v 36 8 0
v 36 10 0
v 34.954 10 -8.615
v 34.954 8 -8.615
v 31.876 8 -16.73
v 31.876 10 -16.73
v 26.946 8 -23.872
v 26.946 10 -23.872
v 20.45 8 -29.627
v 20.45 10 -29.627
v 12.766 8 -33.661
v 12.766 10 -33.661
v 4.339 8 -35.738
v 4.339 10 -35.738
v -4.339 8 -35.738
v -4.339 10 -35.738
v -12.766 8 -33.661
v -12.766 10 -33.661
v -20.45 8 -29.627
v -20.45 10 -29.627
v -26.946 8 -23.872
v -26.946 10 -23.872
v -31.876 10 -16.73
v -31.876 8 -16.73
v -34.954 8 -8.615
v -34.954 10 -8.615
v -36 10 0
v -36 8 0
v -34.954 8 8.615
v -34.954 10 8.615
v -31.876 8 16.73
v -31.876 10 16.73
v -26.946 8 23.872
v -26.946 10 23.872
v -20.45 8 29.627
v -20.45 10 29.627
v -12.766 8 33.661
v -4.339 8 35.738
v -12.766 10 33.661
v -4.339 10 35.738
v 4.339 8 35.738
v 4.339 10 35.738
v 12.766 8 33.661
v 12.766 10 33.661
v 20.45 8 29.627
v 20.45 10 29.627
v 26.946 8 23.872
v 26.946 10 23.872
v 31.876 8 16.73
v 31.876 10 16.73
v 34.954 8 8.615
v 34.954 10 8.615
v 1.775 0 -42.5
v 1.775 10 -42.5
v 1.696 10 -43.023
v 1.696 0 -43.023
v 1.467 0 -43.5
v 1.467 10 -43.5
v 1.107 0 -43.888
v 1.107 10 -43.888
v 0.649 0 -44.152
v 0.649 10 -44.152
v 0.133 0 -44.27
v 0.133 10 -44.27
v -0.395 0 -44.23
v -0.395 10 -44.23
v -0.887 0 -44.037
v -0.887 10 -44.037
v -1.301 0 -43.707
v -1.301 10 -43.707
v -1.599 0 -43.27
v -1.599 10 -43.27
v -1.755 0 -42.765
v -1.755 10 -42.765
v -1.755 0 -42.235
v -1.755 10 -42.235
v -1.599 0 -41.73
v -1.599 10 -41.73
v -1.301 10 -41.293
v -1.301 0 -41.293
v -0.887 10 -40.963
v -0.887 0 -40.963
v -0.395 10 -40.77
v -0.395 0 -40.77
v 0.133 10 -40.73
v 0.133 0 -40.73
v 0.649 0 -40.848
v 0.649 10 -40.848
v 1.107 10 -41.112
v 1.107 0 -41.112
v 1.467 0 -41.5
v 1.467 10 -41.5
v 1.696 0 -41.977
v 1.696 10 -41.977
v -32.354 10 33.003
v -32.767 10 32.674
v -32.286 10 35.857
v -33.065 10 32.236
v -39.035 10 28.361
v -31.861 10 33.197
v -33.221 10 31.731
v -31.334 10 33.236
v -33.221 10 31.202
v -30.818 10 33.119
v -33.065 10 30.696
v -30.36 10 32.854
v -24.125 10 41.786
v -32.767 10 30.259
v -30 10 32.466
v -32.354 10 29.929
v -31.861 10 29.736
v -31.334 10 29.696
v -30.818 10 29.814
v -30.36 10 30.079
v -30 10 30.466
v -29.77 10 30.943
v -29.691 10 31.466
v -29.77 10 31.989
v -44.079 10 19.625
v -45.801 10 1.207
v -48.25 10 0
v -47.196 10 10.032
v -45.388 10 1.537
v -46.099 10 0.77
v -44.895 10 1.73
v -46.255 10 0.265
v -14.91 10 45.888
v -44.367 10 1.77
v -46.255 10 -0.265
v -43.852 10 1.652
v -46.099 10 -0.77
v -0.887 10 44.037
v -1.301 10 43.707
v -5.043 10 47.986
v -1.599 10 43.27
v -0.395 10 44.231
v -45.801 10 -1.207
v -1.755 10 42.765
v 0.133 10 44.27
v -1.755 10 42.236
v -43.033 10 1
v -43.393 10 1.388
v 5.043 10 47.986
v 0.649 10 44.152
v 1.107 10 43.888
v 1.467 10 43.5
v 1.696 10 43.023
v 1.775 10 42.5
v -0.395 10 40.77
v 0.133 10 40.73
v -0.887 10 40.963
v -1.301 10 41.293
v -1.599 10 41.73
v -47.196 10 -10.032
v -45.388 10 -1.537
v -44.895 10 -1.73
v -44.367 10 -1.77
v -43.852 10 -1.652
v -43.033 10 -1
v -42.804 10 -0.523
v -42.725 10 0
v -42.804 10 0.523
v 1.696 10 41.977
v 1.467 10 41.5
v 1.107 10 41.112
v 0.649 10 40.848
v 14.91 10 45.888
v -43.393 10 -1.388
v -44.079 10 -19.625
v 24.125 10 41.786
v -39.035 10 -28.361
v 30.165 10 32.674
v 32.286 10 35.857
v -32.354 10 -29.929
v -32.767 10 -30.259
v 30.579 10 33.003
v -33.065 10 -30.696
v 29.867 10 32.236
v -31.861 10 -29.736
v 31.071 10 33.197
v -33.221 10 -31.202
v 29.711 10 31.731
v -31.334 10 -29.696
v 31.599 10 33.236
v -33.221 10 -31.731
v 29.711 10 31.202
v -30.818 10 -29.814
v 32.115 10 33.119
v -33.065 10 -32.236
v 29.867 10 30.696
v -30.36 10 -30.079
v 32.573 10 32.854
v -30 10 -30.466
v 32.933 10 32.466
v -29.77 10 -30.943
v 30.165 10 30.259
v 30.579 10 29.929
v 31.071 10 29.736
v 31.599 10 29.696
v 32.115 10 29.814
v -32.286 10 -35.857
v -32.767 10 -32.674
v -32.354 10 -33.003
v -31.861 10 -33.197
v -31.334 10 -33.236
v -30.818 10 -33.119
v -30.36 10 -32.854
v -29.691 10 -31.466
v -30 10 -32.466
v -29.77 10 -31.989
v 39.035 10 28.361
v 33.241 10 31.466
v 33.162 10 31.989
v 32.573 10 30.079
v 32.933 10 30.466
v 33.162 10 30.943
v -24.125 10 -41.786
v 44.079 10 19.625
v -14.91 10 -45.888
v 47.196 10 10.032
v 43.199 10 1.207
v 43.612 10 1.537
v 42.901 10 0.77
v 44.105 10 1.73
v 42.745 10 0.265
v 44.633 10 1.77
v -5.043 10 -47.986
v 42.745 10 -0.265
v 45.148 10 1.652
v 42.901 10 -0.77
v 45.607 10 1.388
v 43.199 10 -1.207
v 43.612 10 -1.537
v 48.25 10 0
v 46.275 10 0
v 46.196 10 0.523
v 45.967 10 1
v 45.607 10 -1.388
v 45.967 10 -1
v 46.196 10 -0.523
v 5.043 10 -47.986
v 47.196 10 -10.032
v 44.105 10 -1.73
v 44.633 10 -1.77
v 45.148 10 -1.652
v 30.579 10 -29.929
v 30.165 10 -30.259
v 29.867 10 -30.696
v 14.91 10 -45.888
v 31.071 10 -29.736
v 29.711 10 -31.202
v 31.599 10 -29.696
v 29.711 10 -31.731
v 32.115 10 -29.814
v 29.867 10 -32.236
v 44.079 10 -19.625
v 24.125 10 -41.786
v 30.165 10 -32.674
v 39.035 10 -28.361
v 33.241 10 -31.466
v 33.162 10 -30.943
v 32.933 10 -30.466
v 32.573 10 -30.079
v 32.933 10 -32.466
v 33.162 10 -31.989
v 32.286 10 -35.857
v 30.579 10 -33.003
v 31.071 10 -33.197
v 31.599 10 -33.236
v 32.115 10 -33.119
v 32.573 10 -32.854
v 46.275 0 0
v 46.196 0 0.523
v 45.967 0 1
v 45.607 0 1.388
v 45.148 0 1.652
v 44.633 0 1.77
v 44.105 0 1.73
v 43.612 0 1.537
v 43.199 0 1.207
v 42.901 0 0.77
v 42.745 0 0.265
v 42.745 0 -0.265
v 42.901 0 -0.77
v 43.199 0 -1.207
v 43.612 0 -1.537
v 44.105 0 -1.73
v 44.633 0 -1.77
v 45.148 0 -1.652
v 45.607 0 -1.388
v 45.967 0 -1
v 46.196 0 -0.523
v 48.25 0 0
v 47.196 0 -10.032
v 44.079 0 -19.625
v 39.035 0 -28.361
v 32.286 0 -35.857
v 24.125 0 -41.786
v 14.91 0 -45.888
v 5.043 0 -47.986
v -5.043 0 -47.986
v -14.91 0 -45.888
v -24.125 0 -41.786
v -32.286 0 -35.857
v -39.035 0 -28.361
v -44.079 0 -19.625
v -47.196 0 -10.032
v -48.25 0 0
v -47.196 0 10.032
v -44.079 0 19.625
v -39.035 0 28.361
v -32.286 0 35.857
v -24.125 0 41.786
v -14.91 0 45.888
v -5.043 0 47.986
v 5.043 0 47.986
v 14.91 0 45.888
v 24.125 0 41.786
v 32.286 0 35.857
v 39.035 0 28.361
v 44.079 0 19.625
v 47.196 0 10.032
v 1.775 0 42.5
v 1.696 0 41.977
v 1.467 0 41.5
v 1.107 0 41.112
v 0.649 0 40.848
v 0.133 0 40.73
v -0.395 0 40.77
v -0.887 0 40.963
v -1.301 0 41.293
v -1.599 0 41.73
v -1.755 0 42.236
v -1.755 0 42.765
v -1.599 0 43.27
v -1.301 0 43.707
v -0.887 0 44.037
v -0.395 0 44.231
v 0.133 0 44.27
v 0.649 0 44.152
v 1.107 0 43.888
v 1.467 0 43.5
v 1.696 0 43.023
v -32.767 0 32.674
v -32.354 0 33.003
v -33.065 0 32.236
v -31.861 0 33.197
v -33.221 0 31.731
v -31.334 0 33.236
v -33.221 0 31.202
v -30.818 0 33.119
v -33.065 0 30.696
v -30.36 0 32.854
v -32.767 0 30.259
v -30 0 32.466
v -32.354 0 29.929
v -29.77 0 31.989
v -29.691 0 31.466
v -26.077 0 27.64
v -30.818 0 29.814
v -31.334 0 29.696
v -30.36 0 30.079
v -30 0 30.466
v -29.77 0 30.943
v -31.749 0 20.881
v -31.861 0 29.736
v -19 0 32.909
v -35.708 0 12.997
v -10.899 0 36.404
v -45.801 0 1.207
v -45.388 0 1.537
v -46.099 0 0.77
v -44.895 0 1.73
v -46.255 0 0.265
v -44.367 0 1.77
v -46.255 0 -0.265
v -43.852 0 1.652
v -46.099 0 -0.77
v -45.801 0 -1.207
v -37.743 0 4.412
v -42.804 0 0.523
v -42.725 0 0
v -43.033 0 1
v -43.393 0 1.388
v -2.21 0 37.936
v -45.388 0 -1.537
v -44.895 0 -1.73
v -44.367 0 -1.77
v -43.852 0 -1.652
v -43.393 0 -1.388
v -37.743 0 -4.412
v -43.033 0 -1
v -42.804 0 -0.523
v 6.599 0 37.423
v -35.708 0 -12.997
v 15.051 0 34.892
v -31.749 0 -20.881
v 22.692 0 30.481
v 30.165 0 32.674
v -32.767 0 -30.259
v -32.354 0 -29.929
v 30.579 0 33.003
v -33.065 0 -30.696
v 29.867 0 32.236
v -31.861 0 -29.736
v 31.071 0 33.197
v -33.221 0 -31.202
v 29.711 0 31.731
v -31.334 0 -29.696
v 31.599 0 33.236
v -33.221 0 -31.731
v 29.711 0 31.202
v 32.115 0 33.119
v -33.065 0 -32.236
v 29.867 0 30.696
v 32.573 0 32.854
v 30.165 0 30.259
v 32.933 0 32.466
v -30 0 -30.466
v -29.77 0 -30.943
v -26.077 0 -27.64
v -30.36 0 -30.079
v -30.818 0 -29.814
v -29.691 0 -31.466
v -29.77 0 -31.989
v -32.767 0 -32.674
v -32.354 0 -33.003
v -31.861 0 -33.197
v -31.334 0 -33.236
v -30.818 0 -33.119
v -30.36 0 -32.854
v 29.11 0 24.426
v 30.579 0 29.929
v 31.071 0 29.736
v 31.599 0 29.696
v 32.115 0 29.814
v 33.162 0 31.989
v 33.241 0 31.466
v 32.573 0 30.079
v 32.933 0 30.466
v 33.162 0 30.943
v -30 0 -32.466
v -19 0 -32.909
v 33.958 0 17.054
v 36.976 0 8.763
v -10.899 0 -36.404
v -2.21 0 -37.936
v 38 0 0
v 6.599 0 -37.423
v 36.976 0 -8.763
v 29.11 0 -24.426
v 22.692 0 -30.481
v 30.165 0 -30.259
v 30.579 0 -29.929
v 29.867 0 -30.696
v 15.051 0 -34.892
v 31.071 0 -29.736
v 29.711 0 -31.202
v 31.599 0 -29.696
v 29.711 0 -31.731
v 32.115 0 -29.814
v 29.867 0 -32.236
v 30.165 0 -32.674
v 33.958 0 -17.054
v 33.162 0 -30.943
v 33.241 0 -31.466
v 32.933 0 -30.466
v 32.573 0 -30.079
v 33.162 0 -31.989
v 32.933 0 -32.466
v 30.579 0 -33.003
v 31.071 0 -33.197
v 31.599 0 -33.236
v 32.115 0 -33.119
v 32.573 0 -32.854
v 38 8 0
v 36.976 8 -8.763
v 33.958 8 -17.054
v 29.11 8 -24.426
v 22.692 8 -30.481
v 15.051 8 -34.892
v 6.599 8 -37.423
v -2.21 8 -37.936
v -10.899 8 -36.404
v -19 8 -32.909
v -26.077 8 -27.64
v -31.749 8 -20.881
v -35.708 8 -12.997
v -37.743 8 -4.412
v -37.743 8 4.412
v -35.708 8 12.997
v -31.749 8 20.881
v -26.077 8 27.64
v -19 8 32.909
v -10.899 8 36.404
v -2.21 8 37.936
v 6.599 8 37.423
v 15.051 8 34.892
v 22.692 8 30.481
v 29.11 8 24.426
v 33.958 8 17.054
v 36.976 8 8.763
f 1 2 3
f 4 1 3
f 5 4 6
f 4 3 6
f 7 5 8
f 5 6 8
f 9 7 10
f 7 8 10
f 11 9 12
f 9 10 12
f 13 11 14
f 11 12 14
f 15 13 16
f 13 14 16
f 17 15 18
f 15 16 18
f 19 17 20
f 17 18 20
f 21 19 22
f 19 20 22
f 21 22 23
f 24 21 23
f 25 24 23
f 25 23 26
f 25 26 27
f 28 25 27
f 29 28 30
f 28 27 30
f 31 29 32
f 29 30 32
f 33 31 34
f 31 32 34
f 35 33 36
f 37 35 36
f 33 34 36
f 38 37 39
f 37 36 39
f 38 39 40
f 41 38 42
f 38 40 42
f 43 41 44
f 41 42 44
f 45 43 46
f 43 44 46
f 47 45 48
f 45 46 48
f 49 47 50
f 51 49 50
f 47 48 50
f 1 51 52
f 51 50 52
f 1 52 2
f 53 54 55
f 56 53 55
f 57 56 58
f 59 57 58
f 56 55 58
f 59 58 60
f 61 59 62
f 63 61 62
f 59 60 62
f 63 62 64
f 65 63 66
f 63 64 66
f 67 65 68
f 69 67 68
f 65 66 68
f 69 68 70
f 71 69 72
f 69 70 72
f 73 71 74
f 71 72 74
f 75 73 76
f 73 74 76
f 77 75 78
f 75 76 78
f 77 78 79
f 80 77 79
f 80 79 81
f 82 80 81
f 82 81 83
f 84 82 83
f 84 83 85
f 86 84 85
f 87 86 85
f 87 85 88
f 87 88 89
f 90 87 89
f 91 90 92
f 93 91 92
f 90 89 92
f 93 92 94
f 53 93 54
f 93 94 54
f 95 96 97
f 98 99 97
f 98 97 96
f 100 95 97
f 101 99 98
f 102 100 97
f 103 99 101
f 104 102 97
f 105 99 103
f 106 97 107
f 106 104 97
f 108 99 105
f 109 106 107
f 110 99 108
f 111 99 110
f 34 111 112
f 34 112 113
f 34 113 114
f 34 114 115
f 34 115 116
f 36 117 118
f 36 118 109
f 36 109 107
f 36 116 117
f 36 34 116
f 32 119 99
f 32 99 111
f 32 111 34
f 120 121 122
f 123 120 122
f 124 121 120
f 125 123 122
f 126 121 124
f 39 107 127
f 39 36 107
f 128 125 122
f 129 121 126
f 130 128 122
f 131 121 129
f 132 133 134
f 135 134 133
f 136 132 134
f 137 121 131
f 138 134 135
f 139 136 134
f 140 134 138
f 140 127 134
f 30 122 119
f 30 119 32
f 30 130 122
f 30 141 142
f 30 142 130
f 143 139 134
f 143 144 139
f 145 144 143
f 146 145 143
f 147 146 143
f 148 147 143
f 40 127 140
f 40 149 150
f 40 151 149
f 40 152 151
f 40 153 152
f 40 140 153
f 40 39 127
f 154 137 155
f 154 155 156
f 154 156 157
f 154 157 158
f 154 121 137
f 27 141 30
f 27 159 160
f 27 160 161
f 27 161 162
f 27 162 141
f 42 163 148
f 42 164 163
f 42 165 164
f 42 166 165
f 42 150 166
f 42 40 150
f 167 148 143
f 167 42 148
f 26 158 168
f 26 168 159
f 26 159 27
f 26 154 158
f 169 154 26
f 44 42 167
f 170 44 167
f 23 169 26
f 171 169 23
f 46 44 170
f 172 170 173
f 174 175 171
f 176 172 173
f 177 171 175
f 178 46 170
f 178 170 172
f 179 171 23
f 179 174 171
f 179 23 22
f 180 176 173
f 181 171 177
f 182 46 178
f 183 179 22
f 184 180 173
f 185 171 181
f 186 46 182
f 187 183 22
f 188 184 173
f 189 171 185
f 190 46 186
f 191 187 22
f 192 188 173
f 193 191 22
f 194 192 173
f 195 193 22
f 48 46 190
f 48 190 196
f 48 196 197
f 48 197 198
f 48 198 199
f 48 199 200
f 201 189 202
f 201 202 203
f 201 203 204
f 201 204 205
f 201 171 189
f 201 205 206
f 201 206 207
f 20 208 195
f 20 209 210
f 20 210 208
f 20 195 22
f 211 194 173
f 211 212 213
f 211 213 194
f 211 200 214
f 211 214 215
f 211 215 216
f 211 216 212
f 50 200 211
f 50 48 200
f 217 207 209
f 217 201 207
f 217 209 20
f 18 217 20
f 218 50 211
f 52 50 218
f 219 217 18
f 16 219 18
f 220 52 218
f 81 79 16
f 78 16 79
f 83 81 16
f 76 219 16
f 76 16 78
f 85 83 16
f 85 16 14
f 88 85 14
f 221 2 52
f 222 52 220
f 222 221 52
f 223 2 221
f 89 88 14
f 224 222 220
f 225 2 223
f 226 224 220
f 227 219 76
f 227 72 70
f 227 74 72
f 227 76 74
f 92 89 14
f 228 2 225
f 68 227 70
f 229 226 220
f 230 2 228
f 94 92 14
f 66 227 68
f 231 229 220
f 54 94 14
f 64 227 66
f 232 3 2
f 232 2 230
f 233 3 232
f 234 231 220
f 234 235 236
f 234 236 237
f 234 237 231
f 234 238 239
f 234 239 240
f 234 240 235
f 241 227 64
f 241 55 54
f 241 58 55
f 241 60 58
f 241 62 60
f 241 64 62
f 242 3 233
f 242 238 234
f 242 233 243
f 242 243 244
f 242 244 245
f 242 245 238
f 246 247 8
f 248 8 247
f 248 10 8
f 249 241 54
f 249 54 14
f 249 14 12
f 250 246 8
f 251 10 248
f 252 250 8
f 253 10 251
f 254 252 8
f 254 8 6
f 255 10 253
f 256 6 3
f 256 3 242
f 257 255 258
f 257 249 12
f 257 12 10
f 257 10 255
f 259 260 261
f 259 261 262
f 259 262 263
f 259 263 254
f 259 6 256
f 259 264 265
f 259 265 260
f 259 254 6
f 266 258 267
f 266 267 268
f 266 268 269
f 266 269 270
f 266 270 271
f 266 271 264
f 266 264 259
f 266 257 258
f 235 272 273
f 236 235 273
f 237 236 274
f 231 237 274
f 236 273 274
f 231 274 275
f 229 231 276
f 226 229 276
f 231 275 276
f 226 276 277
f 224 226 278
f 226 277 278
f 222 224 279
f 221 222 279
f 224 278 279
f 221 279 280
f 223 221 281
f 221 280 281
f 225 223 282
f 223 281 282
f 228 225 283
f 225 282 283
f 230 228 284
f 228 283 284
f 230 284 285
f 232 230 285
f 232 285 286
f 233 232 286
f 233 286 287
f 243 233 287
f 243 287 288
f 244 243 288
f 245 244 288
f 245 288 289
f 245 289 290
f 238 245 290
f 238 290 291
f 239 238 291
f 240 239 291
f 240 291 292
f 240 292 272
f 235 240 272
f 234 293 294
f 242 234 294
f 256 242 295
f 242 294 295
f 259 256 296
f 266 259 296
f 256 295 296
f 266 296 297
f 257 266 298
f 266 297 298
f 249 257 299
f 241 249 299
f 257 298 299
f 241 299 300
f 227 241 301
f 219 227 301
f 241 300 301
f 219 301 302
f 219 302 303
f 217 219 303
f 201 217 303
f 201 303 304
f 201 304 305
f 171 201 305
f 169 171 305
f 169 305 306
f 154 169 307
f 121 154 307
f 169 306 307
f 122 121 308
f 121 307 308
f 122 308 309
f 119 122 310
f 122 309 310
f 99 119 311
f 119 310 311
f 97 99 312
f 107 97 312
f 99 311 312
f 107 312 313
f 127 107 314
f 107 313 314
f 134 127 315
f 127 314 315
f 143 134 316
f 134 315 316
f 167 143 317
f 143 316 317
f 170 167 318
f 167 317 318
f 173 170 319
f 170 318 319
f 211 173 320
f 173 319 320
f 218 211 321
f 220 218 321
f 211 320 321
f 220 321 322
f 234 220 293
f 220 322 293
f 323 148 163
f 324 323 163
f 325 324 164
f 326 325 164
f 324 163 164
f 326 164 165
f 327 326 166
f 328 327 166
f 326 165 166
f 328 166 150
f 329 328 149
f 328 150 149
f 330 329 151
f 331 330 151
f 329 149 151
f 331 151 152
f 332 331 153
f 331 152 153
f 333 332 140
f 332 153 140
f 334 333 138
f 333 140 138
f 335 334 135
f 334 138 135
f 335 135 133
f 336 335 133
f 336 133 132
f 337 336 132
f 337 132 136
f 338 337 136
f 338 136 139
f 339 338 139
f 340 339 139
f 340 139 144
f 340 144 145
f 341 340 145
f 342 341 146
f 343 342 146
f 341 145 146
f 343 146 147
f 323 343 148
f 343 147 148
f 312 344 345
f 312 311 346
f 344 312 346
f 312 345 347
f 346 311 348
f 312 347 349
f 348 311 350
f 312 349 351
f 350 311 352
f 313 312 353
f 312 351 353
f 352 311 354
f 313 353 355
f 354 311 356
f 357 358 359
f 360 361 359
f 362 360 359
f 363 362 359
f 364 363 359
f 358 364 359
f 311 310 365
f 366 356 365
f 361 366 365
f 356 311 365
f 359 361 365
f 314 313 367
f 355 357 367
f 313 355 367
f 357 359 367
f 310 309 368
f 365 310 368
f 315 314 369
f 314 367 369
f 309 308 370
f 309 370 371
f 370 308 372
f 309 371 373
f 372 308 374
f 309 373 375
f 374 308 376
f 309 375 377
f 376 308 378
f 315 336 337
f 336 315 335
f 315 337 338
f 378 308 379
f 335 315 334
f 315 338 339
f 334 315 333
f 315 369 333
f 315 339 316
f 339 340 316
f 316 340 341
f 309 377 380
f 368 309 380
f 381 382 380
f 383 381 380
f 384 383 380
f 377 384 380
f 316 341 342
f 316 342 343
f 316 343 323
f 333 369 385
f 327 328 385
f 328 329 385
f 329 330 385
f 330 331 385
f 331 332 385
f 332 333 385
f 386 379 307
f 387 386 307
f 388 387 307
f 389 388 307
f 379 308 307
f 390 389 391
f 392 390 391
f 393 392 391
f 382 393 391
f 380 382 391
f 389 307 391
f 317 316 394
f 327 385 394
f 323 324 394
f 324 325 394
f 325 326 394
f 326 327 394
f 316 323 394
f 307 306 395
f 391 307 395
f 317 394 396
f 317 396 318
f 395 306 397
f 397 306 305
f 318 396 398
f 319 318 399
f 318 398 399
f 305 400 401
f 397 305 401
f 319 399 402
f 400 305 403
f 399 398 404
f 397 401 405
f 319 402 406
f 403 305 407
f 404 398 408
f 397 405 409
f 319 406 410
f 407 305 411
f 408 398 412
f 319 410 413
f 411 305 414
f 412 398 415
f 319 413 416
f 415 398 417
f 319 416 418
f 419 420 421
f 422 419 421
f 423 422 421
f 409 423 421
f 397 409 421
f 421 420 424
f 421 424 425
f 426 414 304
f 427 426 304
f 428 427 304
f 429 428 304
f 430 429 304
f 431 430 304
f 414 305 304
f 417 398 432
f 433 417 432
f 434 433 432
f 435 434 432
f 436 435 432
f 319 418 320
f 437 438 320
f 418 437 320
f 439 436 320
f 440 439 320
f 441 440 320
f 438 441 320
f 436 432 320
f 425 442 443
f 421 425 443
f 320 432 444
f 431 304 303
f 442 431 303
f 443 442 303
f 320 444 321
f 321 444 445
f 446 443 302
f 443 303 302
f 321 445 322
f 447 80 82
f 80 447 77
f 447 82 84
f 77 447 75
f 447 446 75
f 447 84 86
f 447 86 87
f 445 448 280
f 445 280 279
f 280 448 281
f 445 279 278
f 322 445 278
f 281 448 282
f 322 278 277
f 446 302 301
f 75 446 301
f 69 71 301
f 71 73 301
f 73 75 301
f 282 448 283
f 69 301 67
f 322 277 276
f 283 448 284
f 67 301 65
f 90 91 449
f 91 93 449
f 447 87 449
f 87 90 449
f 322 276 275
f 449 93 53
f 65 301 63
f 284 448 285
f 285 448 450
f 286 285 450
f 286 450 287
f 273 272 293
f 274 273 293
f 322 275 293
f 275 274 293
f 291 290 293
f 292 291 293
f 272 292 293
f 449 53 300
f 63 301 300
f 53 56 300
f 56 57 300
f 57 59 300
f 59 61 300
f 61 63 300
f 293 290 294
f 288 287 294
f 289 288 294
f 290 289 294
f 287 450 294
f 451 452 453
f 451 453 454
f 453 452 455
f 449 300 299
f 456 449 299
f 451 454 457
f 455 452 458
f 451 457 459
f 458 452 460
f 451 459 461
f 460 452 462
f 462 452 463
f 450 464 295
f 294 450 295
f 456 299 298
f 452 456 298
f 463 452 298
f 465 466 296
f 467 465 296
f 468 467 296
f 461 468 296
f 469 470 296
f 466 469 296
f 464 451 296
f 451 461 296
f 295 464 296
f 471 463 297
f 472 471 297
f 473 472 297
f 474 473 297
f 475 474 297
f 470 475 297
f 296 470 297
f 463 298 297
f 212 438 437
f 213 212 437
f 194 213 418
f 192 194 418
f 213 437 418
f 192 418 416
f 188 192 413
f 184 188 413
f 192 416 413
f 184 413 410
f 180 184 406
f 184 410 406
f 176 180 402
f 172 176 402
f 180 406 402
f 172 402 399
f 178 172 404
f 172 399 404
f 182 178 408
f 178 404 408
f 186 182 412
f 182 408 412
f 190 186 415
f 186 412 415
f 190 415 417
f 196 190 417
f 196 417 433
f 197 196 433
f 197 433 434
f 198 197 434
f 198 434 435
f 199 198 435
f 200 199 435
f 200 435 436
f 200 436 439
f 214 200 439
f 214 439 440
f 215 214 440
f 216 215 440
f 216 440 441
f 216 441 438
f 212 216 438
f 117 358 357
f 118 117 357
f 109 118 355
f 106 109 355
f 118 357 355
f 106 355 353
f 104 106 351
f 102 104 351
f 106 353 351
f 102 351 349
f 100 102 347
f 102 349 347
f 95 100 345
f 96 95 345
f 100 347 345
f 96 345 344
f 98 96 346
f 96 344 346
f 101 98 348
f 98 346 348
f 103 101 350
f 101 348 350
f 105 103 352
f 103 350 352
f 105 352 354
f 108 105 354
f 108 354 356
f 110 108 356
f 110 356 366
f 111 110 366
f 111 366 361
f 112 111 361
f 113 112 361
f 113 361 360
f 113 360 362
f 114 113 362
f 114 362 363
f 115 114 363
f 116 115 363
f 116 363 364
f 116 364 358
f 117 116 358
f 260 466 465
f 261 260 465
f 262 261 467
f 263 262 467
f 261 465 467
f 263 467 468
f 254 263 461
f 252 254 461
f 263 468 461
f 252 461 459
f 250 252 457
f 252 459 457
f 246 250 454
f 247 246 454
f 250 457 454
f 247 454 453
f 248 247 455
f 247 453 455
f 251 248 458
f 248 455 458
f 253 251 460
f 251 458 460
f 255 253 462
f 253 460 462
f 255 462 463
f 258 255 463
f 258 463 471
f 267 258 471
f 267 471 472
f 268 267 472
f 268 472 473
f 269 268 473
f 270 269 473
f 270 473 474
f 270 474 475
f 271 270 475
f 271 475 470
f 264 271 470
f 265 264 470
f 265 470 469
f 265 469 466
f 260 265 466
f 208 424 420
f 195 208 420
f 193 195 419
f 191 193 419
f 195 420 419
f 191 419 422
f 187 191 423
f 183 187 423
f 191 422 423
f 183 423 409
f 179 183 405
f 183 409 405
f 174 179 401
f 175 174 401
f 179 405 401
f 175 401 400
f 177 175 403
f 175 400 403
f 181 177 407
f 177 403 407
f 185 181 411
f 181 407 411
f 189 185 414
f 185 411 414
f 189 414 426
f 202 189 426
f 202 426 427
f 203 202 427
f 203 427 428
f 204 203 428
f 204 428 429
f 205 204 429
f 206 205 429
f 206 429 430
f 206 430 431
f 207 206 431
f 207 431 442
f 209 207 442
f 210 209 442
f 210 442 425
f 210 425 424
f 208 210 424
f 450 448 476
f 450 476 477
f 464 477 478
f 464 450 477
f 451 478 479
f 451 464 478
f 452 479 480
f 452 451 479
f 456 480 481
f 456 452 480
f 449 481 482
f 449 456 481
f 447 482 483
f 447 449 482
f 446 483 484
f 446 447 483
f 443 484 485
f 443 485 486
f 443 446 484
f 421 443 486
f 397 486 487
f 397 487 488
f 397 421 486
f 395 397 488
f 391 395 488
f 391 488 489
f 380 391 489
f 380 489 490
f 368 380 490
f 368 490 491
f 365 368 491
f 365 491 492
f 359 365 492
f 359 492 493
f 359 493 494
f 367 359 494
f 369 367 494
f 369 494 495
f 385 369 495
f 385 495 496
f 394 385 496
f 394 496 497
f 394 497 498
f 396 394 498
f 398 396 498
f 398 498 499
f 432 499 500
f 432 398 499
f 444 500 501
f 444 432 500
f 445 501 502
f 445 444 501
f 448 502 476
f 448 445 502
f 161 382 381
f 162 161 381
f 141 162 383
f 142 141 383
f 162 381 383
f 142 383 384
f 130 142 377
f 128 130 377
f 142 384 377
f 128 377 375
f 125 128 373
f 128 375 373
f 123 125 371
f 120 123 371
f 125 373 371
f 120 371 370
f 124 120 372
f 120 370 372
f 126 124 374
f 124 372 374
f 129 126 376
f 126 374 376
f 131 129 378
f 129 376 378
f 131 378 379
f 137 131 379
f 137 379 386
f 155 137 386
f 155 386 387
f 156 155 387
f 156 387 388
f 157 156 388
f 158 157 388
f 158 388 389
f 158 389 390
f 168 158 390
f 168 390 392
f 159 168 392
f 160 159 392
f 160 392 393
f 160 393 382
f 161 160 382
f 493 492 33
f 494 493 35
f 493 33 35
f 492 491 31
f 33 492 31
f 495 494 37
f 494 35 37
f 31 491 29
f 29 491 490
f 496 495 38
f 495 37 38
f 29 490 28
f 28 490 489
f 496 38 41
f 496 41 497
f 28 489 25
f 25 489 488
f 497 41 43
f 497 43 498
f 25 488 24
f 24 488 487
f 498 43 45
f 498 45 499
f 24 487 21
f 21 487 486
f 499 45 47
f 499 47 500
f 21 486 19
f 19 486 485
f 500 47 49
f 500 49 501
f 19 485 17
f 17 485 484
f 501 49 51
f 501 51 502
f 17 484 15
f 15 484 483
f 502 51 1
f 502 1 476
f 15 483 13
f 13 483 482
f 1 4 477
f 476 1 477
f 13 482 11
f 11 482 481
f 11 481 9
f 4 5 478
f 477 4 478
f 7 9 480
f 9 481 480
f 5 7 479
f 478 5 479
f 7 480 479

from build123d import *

# Parameters (mm, degrees)
SKETCH_1_R               = 48.25
SKETCH_1_R_2             = 38
EXTRUDE_1_DEPTH          = 10
SKETCH_2_R               = 38
SKETCH_2_R_2             = 36
EXTRUDE_2_DEPTH          = 2
SKETCH_3_R               = 1.775
CUT_EXTRUDE_1_DEPTH      = 1
CUT_EXTRUDE_1_DEPTH_BACK = 11
SKETCH_4_R               = 2
EXTRUDE_3_DEPTH          = 10
SKETCH_5_R               = 1.775
CUT_EXTRUDE_2_DEPTH      = 10


with BuildPart() as part:
    # 草图1 → 凸台-拉伸1 (new body)
    with BuildSketch(Plane(origin=(0, 0, 0), x_dir=(1, 0, 0), z_dir=(0, 1, 0))):
        Circle(SKETCH_1_R)
        Circle(SKETCH_1_R_2, mode=Mode.SUBTRACT)
    extrude(amount=EXTRUDE_1_DEPTH)

    # 草图2 → 凸台-拉伸2 (add)
    with BuildSketch(Plane(origin=(0, 10, 0), x_dir=(1, 0, 0), z_dir=(0, 1, 0))):
        Circle(SKETCH_2_R)
        Circle(SKETCH_2_R_2, mode=Mode.SUBTRACT)
    extrude(amount=-EXTRUDE_2_DEPTH)

    # 草图3 → 切除-拉伸1 (cut, two sides)
    with BuildSketch(Plane.XZ) as cut_extrude_1_sk:
        with Locations((0, 44.5)):
            Circle(SKETCH_3_R)
        with Locations((31.466251763, 31.466251763)):
            Circle(SKETCH_3_R)
        with Locations((44.5, 0)):
            Circle(SKETCH_3_R)
        with Locations((31.466251763, -31.466251763)):
            Circle(SKETCH_3_R)
        with Locations((0, -44.5)):
            Circle(SKETCH_3_R)
        with Locations((-31.466251763, -31.466251763)):
            Circle(SKETCH_3_R)
        with Locations((-44.5, 0)):
            Circle(SKETCH_3_R)
        with Locations((-31.466251763, 31.466251763)):
            Circle(SKETCH_3_R)
    extrude(amount=CUT_EXTRUDE_1_DEPTH, mode=Mode.SUBTRACT)
    extrude(cut_extrude_1_sk.sketch, amount=-CUT_EXTRUDE_1_DEPTH_BACK, mode=Mode.SUBTRACT)

    # 草图4 → 凸台-拉伸3 (add)
    with BuildSketch(Plane(origin=(0, 10, 0), x_dir=(1, 0, 0), z_dir=(0, 1, 0))):
        with Locations((0, -44.5)):
            Circle(SKETCH_4_R)
        with Locations((0, 44.5)):
            Circle(SKETCH_4_R)
    extrude(amount=-EXTRUDE_3_DEPTH)

    # 草图5 → 切除-拉伸2 (cut)
    with BuildSketch(Plane(origin=(0, 10, 0), x_dir=(1, 0, 0), z_dir=(0, 1, 0))):
        with Locations((5.5258e-05, -42.50007959)):
            Circle(SKETCH_5_R)
        with Locations((2.4326e-05, 42.499999999)):
            Circle(SKETCH_5_R)
    extrude(amount=-CUT_EXTRUDE_2_DEPTH, mode=Mode.SUBTRACT)


solid = part.part
